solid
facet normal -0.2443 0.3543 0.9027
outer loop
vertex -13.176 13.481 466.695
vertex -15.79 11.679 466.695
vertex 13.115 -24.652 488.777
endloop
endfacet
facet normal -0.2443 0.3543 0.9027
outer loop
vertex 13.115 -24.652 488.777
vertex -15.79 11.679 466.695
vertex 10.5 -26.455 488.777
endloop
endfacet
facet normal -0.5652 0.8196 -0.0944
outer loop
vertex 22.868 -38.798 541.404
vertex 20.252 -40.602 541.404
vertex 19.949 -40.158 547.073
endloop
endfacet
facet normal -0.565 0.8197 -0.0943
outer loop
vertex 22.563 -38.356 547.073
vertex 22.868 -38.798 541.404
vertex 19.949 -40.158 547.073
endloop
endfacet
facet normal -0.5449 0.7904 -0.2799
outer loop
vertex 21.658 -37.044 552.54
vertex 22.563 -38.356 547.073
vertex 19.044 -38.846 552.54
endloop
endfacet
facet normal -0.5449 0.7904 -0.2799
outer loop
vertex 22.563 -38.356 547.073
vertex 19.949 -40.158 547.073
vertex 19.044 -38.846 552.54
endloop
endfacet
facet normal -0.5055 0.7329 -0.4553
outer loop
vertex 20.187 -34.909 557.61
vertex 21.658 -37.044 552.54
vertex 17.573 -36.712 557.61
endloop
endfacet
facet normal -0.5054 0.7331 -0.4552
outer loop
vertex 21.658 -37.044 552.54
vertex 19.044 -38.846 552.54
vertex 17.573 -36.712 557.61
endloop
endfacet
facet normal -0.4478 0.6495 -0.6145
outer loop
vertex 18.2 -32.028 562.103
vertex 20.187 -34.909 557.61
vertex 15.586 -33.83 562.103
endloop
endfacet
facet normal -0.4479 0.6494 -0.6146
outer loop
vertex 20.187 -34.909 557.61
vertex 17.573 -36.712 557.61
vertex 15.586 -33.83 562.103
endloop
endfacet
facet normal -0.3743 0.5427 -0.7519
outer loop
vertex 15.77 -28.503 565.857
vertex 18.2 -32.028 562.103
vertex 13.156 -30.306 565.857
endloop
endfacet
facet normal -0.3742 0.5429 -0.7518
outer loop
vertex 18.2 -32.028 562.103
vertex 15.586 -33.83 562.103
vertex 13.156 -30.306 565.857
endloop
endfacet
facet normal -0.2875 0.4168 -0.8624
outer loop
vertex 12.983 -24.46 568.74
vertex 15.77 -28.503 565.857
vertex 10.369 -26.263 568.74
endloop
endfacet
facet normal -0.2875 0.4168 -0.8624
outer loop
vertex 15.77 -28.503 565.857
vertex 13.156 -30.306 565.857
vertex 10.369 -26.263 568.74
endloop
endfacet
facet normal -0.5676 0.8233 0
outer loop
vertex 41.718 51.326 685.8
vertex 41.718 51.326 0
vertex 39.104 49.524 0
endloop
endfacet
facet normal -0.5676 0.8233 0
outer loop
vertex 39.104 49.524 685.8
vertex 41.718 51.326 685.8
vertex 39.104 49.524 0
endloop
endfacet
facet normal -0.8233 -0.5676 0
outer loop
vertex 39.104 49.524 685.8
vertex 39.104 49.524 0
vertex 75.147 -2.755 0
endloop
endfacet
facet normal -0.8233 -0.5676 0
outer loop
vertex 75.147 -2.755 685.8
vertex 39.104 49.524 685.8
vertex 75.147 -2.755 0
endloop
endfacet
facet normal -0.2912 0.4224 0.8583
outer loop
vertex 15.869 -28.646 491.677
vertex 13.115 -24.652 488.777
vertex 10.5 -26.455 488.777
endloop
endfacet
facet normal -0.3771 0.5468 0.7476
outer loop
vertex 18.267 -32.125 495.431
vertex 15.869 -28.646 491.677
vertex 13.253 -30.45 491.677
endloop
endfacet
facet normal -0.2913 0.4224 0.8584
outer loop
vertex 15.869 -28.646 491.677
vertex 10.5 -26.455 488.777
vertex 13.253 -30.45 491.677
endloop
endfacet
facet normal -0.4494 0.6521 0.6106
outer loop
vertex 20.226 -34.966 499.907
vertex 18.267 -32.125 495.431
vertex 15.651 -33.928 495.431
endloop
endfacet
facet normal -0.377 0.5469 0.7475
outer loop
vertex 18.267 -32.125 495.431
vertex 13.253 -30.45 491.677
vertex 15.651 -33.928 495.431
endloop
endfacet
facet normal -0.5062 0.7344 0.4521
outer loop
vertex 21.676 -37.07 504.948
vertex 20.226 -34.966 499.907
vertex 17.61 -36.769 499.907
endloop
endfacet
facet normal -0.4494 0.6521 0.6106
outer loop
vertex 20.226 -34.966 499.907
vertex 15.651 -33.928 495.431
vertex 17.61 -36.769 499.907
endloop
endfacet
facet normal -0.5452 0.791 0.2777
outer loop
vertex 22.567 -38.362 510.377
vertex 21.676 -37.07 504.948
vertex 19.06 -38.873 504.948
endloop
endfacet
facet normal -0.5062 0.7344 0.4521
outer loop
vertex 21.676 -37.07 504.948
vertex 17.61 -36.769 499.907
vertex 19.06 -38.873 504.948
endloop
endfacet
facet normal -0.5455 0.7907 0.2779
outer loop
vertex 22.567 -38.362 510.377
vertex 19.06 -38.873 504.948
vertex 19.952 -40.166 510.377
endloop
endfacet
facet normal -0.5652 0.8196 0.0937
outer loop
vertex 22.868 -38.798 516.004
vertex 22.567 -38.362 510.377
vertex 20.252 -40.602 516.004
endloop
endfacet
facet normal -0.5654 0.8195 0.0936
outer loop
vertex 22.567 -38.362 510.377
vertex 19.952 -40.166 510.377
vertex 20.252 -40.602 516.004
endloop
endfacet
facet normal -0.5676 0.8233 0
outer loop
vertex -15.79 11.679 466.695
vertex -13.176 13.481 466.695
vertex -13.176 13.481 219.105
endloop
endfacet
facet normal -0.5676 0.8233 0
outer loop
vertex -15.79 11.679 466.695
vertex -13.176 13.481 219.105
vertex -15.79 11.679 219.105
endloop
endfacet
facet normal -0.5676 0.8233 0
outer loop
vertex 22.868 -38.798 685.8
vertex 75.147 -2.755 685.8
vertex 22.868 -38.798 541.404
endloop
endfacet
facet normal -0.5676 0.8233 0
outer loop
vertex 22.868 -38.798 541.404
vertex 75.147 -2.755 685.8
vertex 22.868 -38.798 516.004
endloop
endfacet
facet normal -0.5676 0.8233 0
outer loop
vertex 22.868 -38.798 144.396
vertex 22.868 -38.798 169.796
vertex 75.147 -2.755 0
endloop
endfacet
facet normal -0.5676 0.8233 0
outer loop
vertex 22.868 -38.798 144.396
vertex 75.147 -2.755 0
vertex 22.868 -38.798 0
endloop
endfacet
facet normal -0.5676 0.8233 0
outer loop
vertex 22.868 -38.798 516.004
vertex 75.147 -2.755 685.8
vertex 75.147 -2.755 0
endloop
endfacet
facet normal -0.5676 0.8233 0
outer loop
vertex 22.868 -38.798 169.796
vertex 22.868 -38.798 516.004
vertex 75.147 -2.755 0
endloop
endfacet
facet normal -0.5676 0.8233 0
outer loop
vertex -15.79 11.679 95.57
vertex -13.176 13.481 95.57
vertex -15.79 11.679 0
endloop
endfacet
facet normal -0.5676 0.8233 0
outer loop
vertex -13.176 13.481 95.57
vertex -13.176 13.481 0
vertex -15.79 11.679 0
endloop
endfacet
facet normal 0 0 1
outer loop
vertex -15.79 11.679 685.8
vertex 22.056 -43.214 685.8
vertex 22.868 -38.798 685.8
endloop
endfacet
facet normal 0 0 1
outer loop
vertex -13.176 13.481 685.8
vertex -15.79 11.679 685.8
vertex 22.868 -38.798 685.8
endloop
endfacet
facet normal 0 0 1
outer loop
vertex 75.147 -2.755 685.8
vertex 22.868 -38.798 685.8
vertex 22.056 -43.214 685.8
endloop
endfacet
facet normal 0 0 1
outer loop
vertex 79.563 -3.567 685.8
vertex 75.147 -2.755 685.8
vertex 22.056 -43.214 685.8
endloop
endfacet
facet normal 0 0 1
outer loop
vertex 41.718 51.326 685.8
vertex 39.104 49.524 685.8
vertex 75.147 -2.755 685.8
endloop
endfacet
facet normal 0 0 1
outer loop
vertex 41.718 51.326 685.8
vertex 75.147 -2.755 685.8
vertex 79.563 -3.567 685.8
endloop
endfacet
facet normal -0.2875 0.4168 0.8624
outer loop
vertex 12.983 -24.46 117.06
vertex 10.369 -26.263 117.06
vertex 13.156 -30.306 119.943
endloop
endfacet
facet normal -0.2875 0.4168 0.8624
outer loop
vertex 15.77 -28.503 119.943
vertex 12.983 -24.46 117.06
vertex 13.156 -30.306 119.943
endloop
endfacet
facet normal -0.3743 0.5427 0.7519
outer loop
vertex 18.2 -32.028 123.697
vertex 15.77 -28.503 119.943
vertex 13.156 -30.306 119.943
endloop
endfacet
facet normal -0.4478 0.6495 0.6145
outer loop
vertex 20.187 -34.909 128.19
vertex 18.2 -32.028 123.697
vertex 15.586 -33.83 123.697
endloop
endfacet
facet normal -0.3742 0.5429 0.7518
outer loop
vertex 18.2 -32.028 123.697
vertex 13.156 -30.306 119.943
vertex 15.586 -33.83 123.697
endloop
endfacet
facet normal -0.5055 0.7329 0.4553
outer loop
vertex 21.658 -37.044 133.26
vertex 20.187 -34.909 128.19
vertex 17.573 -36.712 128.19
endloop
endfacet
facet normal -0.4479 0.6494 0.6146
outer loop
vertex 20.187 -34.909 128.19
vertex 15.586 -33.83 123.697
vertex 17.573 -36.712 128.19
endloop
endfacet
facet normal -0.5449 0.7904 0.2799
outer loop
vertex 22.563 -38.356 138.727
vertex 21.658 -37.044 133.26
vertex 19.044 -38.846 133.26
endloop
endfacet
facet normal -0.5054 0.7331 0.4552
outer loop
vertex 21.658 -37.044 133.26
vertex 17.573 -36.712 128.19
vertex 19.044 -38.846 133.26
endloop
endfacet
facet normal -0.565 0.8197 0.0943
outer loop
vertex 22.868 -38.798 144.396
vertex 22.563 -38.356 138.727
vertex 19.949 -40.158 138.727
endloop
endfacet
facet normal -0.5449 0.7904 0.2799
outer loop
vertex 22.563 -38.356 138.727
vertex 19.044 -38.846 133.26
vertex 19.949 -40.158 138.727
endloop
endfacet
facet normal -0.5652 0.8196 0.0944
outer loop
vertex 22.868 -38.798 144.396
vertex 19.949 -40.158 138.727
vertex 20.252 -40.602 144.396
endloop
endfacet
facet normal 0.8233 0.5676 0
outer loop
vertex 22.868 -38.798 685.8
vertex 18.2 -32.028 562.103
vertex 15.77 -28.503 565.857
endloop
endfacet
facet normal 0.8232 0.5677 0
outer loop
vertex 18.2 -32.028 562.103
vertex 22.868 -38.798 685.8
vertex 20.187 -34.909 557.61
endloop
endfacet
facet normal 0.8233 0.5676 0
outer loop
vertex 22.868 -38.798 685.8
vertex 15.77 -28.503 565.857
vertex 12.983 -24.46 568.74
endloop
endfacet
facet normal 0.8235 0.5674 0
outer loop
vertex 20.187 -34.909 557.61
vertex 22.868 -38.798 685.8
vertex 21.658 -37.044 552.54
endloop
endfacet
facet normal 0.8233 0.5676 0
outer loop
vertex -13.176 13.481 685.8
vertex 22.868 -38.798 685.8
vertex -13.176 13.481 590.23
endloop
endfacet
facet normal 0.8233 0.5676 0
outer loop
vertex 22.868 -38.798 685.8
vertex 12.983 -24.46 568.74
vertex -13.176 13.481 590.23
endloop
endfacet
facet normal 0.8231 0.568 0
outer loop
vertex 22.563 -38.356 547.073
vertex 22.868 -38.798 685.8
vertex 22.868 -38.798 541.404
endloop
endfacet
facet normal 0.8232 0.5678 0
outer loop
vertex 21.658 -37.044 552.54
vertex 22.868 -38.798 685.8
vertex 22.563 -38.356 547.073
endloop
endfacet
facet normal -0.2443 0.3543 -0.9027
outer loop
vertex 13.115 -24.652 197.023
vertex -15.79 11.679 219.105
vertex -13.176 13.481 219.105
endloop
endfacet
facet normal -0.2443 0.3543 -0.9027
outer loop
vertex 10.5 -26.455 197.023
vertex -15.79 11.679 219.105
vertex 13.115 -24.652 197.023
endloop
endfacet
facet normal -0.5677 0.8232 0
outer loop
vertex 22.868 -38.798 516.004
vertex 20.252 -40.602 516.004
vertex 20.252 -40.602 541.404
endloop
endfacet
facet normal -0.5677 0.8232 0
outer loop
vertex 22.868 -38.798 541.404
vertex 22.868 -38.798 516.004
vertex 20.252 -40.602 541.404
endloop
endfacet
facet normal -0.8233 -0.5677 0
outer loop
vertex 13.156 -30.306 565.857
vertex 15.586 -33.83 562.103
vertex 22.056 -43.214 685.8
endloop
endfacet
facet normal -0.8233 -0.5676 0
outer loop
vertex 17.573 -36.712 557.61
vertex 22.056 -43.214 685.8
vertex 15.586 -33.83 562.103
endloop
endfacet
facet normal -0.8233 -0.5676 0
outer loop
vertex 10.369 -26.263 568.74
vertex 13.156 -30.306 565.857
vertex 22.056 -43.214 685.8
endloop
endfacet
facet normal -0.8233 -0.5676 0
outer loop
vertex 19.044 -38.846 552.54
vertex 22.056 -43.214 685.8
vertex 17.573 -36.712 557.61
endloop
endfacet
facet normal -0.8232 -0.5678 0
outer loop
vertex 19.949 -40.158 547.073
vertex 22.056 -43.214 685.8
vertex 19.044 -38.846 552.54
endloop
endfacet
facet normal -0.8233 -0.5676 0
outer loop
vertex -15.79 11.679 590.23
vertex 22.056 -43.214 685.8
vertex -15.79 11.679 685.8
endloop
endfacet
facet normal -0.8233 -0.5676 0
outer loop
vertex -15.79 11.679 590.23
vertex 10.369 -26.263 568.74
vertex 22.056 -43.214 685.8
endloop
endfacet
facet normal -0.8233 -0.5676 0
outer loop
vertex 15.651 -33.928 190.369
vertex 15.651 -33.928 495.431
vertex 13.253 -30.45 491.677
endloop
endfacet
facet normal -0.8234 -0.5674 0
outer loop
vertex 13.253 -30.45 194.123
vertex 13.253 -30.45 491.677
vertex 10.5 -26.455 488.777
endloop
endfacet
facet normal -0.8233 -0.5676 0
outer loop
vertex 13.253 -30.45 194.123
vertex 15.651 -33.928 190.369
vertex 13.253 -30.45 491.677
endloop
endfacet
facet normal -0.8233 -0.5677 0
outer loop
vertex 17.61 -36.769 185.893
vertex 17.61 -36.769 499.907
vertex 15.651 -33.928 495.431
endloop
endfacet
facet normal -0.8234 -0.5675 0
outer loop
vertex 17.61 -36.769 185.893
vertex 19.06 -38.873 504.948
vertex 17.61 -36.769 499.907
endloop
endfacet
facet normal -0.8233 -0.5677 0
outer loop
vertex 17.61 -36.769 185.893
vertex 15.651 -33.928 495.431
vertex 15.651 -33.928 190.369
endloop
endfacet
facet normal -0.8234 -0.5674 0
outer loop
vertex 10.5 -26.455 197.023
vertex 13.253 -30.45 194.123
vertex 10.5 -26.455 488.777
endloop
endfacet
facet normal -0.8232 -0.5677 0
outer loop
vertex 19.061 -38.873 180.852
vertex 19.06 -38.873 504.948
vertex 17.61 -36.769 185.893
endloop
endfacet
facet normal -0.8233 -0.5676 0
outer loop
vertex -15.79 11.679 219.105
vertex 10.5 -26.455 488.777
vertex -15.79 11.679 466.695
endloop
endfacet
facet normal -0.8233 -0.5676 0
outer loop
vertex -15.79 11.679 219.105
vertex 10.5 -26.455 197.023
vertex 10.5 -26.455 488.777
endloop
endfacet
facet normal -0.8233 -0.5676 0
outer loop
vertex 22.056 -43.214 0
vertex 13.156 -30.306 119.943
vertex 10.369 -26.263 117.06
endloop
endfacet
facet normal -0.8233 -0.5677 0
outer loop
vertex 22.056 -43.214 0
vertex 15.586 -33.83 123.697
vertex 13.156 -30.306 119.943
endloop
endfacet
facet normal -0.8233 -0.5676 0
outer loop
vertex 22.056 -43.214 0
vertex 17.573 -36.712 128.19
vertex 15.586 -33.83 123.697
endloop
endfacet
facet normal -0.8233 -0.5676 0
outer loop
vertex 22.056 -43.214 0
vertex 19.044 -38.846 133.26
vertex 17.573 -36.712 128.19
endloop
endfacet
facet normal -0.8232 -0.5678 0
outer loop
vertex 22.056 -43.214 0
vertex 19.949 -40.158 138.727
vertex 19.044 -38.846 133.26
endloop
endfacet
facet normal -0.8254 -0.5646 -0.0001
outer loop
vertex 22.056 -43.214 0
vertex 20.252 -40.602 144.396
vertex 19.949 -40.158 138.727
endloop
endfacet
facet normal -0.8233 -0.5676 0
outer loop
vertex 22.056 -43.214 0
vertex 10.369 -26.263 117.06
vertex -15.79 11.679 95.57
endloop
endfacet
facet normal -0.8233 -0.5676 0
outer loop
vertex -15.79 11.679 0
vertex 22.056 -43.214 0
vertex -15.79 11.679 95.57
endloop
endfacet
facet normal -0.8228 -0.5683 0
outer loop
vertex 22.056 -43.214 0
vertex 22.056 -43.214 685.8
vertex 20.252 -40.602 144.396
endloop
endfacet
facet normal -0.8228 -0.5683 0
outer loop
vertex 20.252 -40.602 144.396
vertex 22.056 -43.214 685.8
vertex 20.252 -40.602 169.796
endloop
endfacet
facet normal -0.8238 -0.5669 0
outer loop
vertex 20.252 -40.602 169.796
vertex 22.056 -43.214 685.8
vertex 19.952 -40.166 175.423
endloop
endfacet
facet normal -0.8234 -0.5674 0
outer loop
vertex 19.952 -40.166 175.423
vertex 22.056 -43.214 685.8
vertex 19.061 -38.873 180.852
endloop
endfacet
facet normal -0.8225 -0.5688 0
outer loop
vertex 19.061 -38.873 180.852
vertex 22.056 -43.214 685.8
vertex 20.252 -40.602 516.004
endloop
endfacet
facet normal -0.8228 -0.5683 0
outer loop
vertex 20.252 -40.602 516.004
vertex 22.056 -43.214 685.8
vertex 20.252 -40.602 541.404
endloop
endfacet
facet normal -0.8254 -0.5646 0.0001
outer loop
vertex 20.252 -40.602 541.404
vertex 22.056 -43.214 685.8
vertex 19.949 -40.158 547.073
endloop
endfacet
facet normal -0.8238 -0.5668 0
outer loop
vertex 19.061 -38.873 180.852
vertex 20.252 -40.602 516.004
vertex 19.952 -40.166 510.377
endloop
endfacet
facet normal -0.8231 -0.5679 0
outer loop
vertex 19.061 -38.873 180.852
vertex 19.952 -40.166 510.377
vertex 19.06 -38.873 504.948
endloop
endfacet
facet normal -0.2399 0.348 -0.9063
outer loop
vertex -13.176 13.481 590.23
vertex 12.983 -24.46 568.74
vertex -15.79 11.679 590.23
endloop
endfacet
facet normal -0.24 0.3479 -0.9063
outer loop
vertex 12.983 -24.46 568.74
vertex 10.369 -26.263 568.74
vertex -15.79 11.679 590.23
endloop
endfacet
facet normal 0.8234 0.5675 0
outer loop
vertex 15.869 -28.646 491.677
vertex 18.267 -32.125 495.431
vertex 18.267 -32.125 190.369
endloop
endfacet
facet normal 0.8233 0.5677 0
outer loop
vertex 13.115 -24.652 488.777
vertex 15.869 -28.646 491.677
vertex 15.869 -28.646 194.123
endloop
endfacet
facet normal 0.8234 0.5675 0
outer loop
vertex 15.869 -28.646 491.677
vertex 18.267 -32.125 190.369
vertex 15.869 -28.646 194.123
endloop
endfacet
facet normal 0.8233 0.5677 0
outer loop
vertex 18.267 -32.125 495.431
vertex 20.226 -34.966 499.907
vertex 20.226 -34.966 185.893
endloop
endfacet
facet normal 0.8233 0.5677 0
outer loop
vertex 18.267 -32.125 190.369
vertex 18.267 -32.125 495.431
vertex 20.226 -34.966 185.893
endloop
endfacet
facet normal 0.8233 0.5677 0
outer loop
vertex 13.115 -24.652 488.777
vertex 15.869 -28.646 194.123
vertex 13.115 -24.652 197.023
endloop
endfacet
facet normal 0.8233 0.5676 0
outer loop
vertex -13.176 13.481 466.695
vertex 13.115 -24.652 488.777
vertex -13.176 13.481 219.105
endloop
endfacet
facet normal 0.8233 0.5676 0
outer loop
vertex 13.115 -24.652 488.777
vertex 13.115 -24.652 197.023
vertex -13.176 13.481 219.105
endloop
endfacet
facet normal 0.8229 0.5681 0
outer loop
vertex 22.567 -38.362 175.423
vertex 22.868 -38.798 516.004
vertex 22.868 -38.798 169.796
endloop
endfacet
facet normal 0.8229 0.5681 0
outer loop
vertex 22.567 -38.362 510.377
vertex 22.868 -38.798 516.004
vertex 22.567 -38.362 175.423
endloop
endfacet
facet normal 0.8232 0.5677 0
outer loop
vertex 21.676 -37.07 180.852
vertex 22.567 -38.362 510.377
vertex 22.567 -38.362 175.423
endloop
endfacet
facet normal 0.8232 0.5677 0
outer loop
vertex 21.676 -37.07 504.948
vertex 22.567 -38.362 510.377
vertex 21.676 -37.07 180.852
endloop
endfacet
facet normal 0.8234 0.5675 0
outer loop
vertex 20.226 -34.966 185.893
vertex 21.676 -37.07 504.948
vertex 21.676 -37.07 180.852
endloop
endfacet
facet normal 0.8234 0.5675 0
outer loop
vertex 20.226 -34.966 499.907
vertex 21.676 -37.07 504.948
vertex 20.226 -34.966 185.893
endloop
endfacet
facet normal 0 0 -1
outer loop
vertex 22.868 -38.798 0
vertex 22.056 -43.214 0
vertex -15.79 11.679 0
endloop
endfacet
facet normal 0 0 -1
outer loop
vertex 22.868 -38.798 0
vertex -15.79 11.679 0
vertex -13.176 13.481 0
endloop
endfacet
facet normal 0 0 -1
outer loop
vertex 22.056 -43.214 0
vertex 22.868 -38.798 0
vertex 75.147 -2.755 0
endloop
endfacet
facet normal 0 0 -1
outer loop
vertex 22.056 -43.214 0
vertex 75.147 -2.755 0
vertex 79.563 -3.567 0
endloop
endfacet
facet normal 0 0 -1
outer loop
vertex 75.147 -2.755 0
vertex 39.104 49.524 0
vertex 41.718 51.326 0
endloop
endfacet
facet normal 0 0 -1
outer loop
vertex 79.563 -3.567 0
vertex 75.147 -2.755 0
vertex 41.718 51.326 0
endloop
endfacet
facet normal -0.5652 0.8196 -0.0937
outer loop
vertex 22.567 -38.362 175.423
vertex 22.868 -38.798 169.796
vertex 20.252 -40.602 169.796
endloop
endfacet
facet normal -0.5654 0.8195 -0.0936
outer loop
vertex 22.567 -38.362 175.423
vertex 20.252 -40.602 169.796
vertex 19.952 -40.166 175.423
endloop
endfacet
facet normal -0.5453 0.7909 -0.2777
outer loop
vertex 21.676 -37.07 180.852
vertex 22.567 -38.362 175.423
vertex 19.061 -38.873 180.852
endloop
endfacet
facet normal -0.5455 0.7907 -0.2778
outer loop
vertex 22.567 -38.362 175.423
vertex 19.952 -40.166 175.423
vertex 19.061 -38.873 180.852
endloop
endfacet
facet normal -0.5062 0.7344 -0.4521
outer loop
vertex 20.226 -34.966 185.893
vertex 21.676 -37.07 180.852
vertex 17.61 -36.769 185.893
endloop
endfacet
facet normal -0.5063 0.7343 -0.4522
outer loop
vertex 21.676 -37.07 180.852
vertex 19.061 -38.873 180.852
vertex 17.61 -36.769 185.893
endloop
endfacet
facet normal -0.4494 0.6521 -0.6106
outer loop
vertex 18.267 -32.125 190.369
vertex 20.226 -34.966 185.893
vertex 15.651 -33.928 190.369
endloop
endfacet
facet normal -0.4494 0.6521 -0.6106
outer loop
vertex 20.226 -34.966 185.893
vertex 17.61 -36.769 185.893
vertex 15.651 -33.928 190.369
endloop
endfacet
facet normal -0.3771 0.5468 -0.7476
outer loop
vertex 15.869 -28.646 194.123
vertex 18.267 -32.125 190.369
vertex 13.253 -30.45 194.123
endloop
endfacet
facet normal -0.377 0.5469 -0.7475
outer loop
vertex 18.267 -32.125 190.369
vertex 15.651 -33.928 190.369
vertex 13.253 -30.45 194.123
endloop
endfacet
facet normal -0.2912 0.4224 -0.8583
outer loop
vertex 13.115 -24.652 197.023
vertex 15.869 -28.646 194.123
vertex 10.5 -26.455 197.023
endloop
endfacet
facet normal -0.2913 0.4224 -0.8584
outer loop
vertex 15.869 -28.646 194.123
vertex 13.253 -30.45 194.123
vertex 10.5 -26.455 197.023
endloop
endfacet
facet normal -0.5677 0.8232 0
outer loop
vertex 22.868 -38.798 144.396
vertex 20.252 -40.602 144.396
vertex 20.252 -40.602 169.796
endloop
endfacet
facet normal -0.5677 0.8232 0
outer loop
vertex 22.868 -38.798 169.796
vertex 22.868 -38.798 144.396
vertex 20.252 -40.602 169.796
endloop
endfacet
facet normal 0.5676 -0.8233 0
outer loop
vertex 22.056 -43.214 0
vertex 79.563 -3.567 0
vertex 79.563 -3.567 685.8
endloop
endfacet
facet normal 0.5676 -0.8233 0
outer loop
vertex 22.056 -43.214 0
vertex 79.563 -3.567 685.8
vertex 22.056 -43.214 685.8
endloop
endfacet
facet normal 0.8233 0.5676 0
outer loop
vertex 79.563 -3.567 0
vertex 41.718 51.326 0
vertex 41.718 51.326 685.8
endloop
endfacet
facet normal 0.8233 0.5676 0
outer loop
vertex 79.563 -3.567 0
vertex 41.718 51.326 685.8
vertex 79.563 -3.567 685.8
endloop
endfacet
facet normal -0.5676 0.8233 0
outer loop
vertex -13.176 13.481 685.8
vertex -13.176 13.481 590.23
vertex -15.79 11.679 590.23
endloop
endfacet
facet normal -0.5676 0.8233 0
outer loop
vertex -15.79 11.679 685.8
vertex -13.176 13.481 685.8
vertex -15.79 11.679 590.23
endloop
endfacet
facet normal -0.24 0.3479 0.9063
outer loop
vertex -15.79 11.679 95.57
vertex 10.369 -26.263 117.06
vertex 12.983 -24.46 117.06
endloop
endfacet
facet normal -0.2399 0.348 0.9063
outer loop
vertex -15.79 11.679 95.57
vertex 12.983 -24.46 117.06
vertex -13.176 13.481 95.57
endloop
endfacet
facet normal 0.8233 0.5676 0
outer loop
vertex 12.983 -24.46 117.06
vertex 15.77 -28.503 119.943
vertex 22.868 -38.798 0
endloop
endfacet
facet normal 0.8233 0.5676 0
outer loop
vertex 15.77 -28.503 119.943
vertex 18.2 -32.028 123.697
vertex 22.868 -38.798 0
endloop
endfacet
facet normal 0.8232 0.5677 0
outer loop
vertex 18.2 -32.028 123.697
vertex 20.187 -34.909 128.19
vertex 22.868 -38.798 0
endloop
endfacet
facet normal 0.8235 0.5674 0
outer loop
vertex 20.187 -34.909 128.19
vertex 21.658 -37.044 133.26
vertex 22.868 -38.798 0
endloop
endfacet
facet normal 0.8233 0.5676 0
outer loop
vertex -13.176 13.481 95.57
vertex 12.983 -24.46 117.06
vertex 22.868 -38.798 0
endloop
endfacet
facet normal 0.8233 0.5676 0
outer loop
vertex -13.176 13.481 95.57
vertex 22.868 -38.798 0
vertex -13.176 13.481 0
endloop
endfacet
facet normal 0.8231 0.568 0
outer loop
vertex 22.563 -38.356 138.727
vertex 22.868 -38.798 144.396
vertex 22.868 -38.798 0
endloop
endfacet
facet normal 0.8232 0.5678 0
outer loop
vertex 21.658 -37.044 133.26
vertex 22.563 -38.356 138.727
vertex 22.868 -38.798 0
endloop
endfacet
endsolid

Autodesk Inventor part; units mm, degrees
ref_plane "YZ Plane" through (0, 0, 0) normal (1, 0, 0) x (0, 1, 0)
ref_plane "XZ Plane" through (0, 0, 0) normal (0, 1, 0) x (-1, 0, 0)
ref_plane "XY Plane" through (0, 0, 0) normal (0, 0, 1) x (1, 0, 0)
sketch "Sketch1" plane through (0, 0, 0) normal (0, 0, 1) x (1, 0, 0)
  line L0 (39.1036, 49.5244) -> (75.147, -2.7549)
  line L1 (75.147, -2.7549) -> (22.8678, -38.7983)
  line L2 (22.8678, -38.7983) -> (-13.1757, 13.4809)
  line L3 (41.7176, 51.3265) -> (79.5632, -3.5667)
  line L4 (79.5632, -3.5667) -> (22.056, -43.2145)
  line L5 (22.056, -43.2145) -> (-15.7896, 11.6787)
  line L6 (-13.1757, 13.4809) -> (-15.7896, 11.6787)
  line L7 (41.7176, 51.3265) -> (39.1036, 49.5244)
  point P0 (0, 0)
  dimension "d0" = 63.5
  dimension "d1" = 63.5
  dimension "d2" = 63.5
  dimension "d3" = 3.175
extrude "Extrusion1" add sketch "Sketch1" along normal blind 685.8
sketch "Sketch2" plane through (22.056, -43.2145, 0) normal (-0.8232952, -0.5676134, 0) x (0, 0, 1)
  line L0 (0, 66.675) -> (0, 0) projected
  line L1 (0, 0) -> (685.8, 0) projected
  line L2 (685.8, 66.675) -> (685.8, 0) projected
  line L3 (0, 66.675) -> (685.8, 66.675) projected
  ellipse E0 centre (510.7417, -1678.7212) end of major axis (489.6597, -1678.7212) minor radius 19.9414 projected
  line L4 (0, 3.175) -> (685.8, 3.175) projected
  line L5 (568.7405, 20.5903) -> (590.2302, 66.675)
  line L6 (0, 66.675) -> (685.8, 66.675) projected
  line L7 (466.6953, 66.675) -> (590.2302, 66.675)
  line L8 (508, 66.675) -> (177.8, 66.675) construction
  line L9 (177.8, 20.6195) -> (508, 20.6195) construction
  line L10 (508, 20.6195) -> (558.8, 20.6195) construction
  line L11 (558.8, 20.6195) -> (558.8, 66.675) construction
  line L12 (558.8, 66.675) -> (508, 66.675) construction
  line L13 (508, 66.675) -> (508, 20.6195) construction
  line L14 (466.6953, 66.675) -> (488.7774, 20.3572)
  arc A0 (488.6539, 20.6195) -> (516.004, 3.175) centre (516.004, 33.3375) ccw
  line L15 (541.404, 3.175) -> (516.004, 3.175)
  line L16 (0, 3.175) -> (685.8, 3.175) projected
  arc A1 (541.404, 3.175) -> (568.7405, 20.5903) centre (541.404, 33.3375) ccw
  line L17 (342.9, 3.175) -> (342.9, 66.675) construction
  line L18 (117.0595, 20.5903) -> (95.5698, 66.675)
  line L19 (219.1047, 66.675) -> (95.5698, 66.675)
  line L20 (177.8, 20.6195) -> (127, 20.6195) construction
  line L21 (127, 20.6195) -> (127, 66.675) construction
  line L22 (127, 66.675) -> (177.8, 66.675) construction
  line L23 (177.8, 66.675) -> (177.8, 20.6195) construction
  line L24 (219.1047, 66.675) -> (197.0226, 20.3572)
  arc A2 (169.796, 3.175) -> (197.1461, 20.6195) centre (169.796, 33.3375) ccw
  line L25 (144.396, 3.175) -> (169.796, 3.175)
  arc A3 (117.0595, 20.5903) -> (144.396, 3.175) centre (144.396, 33.3375) ccw
  point P0 (0, 48.0976)
  point P1 (342.9, 20.6195)
  point P2 (175.0583, -1678.7212)
  point P3 (177.8, 66.675)
  dimension "d6" = 65
  dimension "d8" = 144.396
  dimension "d10" = 330.2
  dimension "d11" = 50.8
  dimension "d14" = 25.4
extrude "Extrusion2" cut sketch "Sketch2" against normal blind 6.35 contours L3 L24 A2 L4 A3 L18 | L3 L5 A1 L4 A0 L14
properties part number "2018 Concept Hook"
